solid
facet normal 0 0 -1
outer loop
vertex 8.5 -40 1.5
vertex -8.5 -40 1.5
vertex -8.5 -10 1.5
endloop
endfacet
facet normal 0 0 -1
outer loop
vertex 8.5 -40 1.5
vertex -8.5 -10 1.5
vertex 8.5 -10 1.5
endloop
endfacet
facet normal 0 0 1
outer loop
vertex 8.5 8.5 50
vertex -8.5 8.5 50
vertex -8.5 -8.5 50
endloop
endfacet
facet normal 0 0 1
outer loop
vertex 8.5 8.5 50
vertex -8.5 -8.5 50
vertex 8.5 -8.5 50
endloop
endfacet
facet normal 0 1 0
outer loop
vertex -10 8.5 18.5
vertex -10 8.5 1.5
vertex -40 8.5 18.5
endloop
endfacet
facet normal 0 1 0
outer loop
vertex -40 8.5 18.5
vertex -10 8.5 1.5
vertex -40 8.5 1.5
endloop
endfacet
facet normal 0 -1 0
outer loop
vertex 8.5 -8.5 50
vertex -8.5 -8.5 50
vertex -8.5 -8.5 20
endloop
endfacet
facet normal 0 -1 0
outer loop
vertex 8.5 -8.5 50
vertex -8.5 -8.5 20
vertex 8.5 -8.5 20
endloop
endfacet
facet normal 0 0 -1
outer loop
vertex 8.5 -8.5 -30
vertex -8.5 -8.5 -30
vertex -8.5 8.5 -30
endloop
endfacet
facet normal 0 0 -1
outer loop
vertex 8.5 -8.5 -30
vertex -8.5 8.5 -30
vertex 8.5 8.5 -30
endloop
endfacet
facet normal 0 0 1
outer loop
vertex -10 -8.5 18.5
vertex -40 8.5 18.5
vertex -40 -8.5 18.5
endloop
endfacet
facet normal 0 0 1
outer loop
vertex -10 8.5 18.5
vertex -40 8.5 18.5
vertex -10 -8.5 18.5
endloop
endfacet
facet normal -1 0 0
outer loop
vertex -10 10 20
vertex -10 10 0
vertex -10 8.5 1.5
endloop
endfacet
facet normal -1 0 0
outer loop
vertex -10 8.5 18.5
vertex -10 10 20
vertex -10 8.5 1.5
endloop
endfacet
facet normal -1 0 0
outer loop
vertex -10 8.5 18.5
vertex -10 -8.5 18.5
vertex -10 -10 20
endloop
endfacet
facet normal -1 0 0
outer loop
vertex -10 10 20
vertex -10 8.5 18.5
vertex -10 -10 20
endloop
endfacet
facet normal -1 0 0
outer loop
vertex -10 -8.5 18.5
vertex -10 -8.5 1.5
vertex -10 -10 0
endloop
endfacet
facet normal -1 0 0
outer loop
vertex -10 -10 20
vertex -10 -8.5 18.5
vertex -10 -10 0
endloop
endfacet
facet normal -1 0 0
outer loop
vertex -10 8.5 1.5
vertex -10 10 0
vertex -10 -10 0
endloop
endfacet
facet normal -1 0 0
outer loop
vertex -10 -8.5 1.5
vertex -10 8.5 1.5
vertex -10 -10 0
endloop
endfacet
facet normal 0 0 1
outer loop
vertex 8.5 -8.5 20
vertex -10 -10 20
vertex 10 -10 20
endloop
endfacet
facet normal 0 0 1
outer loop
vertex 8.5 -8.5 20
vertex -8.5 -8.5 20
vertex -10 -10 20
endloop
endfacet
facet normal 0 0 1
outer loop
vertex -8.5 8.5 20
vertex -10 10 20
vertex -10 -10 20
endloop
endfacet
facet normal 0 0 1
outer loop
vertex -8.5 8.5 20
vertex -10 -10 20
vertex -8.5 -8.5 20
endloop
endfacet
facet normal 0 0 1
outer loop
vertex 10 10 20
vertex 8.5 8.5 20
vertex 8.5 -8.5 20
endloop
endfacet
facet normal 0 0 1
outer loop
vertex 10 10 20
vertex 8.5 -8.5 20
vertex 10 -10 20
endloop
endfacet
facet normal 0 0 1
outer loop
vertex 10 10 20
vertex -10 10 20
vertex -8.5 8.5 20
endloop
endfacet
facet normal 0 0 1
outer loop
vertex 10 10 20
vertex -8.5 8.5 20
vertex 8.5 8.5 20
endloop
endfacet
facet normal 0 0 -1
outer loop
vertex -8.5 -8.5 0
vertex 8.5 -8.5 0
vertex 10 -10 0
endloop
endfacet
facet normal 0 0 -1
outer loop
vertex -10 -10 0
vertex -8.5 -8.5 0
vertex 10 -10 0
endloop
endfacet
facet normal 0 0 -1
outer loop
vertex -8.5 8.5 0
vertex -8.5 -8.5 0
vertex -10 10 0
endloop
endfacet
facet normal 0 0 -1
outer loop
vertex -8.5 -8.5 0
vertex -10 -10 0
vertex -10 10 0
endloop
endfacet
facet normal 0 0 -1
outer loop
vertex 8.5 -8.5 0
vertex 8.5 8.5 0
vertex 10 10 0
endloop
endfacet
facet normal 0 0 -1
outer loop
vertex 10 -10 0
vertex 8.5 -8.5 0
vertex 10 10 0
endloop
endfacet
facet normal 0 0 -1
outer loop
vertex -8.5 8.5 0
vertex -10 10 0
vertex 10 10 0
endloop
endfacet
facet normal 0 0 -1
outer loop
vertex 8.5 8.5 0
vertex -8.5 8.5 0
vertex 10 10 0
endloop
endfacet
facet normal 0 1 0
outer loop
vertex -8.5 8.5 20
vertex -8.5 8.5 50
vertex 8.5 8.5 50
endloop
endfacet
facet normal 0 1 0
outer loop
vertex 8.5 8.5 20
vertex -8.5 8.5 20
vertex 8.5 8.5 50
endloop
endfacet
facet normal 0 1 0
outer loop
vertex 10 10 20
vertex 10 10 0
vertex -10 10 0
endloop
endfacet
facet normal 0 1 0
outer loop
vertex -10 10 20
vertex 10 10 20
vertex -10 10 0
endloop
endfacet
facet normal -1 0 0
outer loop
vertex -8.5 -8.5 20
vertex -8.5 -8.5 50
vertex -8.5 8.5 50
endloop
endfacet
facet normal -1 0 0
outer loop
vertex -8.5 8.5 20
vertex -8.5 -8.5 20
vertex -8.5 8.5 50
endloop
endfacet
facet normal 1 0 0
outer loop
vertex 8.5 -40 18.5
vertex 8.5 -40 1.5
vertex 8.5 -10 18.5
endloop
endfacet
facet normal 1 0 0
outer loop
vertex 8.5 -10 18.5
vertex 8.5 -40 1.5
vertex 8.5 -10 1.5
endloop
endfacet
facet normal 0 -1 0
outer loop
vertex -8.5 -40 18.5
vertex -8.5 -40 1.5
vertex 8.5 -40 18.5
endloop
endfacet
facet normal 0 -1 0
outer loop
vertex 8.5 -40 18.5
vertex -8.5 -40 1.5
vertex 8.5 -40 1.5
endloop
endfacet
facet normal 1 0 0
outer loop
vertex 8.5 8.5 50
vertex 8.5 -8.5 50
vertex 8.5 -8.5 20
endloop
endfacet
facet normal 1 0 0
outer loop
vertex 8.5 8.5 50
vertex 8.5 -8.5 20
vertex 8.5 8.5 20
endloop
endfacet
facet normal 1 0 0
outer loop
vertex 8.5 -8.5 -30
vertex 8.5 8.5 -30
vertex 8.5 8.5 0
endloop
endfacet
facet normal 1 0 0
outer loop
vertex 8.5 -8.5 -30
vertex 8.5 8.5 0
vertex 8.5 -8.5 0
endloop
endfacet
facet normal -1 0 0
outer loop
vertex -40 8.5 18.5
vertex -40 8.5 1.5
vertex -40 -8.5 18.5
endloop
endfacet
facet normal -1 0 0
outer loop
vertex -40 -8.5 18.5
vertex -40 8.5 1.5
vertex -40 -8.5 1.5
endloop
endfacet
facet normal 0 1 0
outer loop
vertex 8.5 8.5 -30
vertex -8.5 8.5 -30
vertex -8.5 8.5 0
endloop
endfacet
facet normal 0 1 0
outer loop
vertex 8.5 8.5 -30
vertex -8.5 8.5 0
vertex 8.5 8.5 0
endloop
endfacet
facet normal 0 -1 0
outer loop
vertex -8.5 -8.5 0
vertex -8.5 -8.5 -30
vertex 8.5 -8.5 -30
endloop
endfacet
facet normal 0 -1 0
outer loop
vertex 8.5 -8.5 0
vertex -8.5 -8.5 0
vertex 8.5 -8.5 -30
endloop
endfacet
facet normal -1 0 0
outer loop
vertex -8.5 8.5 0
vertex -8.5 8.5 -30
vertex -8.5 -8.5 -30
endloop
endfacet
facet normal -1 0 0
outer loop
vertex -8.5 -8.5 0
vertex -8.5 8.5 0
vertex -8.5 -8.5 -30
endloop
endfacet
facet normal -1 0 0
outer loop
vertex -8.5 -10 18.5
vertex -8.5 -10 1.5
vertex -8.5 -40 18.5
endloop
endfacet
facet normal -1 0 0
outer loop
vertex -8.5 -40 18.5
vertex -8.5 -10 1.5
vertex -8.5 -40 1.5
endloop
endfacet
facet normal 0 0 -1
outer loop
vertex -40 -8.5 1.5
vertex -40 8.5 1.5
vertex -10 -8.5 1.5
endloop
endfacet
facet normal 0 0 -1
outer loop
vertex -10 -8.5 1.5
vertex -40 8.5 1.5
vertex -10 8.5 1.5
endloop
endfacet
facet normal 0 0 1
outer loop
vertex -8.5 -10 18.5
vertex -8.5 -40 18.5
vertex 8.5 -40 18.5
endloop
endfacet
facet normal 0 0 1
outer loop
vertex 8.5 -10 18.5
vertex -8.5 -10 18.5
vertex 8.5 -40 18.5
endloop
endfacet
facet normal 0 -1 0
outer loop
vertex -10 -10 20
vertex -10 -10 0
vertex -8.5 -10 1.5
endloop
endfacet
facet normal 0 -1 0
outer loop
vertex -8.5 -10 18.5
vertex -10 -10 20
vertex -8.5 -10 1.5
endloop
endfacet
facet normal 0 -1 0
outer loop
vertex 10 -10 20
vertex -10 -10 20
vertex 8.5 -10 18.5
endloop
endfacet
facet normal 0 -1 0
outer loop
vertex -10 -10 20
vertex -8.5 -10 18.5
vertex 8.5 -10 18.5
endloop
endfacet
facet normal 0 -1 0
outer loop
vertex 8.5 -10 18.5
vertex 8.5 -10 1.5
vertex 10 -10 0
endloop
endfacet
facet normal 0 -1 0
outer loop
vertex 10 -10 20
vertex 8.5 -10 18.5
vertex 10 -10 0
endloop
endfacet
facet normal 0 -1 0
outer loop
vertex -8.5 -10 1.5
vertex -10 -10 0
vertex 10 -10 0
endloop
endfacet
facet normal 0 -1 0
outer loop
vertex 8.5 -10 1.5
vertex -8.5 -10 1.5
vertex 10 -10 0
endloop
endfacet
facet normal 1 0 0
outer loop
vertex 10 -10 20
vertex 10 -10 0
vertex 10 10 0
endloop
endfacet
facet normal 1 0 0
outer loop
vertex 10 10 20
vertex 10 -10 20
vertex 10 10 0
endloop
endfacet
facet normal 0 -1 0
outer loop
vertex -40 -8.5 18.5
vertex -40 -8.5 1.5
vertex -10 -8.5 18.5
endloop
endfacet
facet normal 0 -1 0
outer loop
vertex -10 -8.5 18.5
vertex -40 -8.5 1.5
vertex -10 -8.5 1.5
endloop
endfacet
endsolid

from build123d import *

# Parameters (mm, degrees)
F1_DEPTH = 20
F2_START = 1.5
F2_DEPTH = 17
F3_W     = 17
F3_H     = 17
F4_DEPTH = 30
F5_W     = 17
F5_H     = 17
F6_DEPTH = 30


with BuildPart() as f1:
    # F0 (on Top) → F1 (new body)
    with BuildSketch(Plane.XY):
        Polygon((8.5, -10), (10, -10), (10, 10), (-10, 10), (-10, 8.5), (-10, 0), (-10, -8.5), (-10, -10), (-8.5, -10), (0, -10), align=None)
    extrude(amount=F1_DEPTH)

    # F0 (on Top) → F2 (join)
    with BuildSketch(Plane.XY.offset(F2_START)):
        Polygon((-10, 0), (-10, 8.5), (-40, 8.5), (-40, -8.5), (-10, -8.5), align=None)
        Polygon((8.5, -40), (8.5, -10), (0, -10), (-8.5, -10), (-8.5, -40), align=None)
    extrude(amount=F2_DEPTH)

    # F3 (on face) → F4 (join)
    with BuildSketch(Plane.XY.offset(20)):
        Rectangle(F3_W, F3_H)
    extrude(amount=F4_DEPTH)

    # F5 (on face) → F6 (join)
    with BuildSketch(Plane(origin=(0, 0, 0), x_dir=(1, 0, 0), z_dir=(0, 0, -1))):
        Rectangle(F5_W, F5_H)
    extrude(amount=F6_DEPTH)


solid = f1.part
